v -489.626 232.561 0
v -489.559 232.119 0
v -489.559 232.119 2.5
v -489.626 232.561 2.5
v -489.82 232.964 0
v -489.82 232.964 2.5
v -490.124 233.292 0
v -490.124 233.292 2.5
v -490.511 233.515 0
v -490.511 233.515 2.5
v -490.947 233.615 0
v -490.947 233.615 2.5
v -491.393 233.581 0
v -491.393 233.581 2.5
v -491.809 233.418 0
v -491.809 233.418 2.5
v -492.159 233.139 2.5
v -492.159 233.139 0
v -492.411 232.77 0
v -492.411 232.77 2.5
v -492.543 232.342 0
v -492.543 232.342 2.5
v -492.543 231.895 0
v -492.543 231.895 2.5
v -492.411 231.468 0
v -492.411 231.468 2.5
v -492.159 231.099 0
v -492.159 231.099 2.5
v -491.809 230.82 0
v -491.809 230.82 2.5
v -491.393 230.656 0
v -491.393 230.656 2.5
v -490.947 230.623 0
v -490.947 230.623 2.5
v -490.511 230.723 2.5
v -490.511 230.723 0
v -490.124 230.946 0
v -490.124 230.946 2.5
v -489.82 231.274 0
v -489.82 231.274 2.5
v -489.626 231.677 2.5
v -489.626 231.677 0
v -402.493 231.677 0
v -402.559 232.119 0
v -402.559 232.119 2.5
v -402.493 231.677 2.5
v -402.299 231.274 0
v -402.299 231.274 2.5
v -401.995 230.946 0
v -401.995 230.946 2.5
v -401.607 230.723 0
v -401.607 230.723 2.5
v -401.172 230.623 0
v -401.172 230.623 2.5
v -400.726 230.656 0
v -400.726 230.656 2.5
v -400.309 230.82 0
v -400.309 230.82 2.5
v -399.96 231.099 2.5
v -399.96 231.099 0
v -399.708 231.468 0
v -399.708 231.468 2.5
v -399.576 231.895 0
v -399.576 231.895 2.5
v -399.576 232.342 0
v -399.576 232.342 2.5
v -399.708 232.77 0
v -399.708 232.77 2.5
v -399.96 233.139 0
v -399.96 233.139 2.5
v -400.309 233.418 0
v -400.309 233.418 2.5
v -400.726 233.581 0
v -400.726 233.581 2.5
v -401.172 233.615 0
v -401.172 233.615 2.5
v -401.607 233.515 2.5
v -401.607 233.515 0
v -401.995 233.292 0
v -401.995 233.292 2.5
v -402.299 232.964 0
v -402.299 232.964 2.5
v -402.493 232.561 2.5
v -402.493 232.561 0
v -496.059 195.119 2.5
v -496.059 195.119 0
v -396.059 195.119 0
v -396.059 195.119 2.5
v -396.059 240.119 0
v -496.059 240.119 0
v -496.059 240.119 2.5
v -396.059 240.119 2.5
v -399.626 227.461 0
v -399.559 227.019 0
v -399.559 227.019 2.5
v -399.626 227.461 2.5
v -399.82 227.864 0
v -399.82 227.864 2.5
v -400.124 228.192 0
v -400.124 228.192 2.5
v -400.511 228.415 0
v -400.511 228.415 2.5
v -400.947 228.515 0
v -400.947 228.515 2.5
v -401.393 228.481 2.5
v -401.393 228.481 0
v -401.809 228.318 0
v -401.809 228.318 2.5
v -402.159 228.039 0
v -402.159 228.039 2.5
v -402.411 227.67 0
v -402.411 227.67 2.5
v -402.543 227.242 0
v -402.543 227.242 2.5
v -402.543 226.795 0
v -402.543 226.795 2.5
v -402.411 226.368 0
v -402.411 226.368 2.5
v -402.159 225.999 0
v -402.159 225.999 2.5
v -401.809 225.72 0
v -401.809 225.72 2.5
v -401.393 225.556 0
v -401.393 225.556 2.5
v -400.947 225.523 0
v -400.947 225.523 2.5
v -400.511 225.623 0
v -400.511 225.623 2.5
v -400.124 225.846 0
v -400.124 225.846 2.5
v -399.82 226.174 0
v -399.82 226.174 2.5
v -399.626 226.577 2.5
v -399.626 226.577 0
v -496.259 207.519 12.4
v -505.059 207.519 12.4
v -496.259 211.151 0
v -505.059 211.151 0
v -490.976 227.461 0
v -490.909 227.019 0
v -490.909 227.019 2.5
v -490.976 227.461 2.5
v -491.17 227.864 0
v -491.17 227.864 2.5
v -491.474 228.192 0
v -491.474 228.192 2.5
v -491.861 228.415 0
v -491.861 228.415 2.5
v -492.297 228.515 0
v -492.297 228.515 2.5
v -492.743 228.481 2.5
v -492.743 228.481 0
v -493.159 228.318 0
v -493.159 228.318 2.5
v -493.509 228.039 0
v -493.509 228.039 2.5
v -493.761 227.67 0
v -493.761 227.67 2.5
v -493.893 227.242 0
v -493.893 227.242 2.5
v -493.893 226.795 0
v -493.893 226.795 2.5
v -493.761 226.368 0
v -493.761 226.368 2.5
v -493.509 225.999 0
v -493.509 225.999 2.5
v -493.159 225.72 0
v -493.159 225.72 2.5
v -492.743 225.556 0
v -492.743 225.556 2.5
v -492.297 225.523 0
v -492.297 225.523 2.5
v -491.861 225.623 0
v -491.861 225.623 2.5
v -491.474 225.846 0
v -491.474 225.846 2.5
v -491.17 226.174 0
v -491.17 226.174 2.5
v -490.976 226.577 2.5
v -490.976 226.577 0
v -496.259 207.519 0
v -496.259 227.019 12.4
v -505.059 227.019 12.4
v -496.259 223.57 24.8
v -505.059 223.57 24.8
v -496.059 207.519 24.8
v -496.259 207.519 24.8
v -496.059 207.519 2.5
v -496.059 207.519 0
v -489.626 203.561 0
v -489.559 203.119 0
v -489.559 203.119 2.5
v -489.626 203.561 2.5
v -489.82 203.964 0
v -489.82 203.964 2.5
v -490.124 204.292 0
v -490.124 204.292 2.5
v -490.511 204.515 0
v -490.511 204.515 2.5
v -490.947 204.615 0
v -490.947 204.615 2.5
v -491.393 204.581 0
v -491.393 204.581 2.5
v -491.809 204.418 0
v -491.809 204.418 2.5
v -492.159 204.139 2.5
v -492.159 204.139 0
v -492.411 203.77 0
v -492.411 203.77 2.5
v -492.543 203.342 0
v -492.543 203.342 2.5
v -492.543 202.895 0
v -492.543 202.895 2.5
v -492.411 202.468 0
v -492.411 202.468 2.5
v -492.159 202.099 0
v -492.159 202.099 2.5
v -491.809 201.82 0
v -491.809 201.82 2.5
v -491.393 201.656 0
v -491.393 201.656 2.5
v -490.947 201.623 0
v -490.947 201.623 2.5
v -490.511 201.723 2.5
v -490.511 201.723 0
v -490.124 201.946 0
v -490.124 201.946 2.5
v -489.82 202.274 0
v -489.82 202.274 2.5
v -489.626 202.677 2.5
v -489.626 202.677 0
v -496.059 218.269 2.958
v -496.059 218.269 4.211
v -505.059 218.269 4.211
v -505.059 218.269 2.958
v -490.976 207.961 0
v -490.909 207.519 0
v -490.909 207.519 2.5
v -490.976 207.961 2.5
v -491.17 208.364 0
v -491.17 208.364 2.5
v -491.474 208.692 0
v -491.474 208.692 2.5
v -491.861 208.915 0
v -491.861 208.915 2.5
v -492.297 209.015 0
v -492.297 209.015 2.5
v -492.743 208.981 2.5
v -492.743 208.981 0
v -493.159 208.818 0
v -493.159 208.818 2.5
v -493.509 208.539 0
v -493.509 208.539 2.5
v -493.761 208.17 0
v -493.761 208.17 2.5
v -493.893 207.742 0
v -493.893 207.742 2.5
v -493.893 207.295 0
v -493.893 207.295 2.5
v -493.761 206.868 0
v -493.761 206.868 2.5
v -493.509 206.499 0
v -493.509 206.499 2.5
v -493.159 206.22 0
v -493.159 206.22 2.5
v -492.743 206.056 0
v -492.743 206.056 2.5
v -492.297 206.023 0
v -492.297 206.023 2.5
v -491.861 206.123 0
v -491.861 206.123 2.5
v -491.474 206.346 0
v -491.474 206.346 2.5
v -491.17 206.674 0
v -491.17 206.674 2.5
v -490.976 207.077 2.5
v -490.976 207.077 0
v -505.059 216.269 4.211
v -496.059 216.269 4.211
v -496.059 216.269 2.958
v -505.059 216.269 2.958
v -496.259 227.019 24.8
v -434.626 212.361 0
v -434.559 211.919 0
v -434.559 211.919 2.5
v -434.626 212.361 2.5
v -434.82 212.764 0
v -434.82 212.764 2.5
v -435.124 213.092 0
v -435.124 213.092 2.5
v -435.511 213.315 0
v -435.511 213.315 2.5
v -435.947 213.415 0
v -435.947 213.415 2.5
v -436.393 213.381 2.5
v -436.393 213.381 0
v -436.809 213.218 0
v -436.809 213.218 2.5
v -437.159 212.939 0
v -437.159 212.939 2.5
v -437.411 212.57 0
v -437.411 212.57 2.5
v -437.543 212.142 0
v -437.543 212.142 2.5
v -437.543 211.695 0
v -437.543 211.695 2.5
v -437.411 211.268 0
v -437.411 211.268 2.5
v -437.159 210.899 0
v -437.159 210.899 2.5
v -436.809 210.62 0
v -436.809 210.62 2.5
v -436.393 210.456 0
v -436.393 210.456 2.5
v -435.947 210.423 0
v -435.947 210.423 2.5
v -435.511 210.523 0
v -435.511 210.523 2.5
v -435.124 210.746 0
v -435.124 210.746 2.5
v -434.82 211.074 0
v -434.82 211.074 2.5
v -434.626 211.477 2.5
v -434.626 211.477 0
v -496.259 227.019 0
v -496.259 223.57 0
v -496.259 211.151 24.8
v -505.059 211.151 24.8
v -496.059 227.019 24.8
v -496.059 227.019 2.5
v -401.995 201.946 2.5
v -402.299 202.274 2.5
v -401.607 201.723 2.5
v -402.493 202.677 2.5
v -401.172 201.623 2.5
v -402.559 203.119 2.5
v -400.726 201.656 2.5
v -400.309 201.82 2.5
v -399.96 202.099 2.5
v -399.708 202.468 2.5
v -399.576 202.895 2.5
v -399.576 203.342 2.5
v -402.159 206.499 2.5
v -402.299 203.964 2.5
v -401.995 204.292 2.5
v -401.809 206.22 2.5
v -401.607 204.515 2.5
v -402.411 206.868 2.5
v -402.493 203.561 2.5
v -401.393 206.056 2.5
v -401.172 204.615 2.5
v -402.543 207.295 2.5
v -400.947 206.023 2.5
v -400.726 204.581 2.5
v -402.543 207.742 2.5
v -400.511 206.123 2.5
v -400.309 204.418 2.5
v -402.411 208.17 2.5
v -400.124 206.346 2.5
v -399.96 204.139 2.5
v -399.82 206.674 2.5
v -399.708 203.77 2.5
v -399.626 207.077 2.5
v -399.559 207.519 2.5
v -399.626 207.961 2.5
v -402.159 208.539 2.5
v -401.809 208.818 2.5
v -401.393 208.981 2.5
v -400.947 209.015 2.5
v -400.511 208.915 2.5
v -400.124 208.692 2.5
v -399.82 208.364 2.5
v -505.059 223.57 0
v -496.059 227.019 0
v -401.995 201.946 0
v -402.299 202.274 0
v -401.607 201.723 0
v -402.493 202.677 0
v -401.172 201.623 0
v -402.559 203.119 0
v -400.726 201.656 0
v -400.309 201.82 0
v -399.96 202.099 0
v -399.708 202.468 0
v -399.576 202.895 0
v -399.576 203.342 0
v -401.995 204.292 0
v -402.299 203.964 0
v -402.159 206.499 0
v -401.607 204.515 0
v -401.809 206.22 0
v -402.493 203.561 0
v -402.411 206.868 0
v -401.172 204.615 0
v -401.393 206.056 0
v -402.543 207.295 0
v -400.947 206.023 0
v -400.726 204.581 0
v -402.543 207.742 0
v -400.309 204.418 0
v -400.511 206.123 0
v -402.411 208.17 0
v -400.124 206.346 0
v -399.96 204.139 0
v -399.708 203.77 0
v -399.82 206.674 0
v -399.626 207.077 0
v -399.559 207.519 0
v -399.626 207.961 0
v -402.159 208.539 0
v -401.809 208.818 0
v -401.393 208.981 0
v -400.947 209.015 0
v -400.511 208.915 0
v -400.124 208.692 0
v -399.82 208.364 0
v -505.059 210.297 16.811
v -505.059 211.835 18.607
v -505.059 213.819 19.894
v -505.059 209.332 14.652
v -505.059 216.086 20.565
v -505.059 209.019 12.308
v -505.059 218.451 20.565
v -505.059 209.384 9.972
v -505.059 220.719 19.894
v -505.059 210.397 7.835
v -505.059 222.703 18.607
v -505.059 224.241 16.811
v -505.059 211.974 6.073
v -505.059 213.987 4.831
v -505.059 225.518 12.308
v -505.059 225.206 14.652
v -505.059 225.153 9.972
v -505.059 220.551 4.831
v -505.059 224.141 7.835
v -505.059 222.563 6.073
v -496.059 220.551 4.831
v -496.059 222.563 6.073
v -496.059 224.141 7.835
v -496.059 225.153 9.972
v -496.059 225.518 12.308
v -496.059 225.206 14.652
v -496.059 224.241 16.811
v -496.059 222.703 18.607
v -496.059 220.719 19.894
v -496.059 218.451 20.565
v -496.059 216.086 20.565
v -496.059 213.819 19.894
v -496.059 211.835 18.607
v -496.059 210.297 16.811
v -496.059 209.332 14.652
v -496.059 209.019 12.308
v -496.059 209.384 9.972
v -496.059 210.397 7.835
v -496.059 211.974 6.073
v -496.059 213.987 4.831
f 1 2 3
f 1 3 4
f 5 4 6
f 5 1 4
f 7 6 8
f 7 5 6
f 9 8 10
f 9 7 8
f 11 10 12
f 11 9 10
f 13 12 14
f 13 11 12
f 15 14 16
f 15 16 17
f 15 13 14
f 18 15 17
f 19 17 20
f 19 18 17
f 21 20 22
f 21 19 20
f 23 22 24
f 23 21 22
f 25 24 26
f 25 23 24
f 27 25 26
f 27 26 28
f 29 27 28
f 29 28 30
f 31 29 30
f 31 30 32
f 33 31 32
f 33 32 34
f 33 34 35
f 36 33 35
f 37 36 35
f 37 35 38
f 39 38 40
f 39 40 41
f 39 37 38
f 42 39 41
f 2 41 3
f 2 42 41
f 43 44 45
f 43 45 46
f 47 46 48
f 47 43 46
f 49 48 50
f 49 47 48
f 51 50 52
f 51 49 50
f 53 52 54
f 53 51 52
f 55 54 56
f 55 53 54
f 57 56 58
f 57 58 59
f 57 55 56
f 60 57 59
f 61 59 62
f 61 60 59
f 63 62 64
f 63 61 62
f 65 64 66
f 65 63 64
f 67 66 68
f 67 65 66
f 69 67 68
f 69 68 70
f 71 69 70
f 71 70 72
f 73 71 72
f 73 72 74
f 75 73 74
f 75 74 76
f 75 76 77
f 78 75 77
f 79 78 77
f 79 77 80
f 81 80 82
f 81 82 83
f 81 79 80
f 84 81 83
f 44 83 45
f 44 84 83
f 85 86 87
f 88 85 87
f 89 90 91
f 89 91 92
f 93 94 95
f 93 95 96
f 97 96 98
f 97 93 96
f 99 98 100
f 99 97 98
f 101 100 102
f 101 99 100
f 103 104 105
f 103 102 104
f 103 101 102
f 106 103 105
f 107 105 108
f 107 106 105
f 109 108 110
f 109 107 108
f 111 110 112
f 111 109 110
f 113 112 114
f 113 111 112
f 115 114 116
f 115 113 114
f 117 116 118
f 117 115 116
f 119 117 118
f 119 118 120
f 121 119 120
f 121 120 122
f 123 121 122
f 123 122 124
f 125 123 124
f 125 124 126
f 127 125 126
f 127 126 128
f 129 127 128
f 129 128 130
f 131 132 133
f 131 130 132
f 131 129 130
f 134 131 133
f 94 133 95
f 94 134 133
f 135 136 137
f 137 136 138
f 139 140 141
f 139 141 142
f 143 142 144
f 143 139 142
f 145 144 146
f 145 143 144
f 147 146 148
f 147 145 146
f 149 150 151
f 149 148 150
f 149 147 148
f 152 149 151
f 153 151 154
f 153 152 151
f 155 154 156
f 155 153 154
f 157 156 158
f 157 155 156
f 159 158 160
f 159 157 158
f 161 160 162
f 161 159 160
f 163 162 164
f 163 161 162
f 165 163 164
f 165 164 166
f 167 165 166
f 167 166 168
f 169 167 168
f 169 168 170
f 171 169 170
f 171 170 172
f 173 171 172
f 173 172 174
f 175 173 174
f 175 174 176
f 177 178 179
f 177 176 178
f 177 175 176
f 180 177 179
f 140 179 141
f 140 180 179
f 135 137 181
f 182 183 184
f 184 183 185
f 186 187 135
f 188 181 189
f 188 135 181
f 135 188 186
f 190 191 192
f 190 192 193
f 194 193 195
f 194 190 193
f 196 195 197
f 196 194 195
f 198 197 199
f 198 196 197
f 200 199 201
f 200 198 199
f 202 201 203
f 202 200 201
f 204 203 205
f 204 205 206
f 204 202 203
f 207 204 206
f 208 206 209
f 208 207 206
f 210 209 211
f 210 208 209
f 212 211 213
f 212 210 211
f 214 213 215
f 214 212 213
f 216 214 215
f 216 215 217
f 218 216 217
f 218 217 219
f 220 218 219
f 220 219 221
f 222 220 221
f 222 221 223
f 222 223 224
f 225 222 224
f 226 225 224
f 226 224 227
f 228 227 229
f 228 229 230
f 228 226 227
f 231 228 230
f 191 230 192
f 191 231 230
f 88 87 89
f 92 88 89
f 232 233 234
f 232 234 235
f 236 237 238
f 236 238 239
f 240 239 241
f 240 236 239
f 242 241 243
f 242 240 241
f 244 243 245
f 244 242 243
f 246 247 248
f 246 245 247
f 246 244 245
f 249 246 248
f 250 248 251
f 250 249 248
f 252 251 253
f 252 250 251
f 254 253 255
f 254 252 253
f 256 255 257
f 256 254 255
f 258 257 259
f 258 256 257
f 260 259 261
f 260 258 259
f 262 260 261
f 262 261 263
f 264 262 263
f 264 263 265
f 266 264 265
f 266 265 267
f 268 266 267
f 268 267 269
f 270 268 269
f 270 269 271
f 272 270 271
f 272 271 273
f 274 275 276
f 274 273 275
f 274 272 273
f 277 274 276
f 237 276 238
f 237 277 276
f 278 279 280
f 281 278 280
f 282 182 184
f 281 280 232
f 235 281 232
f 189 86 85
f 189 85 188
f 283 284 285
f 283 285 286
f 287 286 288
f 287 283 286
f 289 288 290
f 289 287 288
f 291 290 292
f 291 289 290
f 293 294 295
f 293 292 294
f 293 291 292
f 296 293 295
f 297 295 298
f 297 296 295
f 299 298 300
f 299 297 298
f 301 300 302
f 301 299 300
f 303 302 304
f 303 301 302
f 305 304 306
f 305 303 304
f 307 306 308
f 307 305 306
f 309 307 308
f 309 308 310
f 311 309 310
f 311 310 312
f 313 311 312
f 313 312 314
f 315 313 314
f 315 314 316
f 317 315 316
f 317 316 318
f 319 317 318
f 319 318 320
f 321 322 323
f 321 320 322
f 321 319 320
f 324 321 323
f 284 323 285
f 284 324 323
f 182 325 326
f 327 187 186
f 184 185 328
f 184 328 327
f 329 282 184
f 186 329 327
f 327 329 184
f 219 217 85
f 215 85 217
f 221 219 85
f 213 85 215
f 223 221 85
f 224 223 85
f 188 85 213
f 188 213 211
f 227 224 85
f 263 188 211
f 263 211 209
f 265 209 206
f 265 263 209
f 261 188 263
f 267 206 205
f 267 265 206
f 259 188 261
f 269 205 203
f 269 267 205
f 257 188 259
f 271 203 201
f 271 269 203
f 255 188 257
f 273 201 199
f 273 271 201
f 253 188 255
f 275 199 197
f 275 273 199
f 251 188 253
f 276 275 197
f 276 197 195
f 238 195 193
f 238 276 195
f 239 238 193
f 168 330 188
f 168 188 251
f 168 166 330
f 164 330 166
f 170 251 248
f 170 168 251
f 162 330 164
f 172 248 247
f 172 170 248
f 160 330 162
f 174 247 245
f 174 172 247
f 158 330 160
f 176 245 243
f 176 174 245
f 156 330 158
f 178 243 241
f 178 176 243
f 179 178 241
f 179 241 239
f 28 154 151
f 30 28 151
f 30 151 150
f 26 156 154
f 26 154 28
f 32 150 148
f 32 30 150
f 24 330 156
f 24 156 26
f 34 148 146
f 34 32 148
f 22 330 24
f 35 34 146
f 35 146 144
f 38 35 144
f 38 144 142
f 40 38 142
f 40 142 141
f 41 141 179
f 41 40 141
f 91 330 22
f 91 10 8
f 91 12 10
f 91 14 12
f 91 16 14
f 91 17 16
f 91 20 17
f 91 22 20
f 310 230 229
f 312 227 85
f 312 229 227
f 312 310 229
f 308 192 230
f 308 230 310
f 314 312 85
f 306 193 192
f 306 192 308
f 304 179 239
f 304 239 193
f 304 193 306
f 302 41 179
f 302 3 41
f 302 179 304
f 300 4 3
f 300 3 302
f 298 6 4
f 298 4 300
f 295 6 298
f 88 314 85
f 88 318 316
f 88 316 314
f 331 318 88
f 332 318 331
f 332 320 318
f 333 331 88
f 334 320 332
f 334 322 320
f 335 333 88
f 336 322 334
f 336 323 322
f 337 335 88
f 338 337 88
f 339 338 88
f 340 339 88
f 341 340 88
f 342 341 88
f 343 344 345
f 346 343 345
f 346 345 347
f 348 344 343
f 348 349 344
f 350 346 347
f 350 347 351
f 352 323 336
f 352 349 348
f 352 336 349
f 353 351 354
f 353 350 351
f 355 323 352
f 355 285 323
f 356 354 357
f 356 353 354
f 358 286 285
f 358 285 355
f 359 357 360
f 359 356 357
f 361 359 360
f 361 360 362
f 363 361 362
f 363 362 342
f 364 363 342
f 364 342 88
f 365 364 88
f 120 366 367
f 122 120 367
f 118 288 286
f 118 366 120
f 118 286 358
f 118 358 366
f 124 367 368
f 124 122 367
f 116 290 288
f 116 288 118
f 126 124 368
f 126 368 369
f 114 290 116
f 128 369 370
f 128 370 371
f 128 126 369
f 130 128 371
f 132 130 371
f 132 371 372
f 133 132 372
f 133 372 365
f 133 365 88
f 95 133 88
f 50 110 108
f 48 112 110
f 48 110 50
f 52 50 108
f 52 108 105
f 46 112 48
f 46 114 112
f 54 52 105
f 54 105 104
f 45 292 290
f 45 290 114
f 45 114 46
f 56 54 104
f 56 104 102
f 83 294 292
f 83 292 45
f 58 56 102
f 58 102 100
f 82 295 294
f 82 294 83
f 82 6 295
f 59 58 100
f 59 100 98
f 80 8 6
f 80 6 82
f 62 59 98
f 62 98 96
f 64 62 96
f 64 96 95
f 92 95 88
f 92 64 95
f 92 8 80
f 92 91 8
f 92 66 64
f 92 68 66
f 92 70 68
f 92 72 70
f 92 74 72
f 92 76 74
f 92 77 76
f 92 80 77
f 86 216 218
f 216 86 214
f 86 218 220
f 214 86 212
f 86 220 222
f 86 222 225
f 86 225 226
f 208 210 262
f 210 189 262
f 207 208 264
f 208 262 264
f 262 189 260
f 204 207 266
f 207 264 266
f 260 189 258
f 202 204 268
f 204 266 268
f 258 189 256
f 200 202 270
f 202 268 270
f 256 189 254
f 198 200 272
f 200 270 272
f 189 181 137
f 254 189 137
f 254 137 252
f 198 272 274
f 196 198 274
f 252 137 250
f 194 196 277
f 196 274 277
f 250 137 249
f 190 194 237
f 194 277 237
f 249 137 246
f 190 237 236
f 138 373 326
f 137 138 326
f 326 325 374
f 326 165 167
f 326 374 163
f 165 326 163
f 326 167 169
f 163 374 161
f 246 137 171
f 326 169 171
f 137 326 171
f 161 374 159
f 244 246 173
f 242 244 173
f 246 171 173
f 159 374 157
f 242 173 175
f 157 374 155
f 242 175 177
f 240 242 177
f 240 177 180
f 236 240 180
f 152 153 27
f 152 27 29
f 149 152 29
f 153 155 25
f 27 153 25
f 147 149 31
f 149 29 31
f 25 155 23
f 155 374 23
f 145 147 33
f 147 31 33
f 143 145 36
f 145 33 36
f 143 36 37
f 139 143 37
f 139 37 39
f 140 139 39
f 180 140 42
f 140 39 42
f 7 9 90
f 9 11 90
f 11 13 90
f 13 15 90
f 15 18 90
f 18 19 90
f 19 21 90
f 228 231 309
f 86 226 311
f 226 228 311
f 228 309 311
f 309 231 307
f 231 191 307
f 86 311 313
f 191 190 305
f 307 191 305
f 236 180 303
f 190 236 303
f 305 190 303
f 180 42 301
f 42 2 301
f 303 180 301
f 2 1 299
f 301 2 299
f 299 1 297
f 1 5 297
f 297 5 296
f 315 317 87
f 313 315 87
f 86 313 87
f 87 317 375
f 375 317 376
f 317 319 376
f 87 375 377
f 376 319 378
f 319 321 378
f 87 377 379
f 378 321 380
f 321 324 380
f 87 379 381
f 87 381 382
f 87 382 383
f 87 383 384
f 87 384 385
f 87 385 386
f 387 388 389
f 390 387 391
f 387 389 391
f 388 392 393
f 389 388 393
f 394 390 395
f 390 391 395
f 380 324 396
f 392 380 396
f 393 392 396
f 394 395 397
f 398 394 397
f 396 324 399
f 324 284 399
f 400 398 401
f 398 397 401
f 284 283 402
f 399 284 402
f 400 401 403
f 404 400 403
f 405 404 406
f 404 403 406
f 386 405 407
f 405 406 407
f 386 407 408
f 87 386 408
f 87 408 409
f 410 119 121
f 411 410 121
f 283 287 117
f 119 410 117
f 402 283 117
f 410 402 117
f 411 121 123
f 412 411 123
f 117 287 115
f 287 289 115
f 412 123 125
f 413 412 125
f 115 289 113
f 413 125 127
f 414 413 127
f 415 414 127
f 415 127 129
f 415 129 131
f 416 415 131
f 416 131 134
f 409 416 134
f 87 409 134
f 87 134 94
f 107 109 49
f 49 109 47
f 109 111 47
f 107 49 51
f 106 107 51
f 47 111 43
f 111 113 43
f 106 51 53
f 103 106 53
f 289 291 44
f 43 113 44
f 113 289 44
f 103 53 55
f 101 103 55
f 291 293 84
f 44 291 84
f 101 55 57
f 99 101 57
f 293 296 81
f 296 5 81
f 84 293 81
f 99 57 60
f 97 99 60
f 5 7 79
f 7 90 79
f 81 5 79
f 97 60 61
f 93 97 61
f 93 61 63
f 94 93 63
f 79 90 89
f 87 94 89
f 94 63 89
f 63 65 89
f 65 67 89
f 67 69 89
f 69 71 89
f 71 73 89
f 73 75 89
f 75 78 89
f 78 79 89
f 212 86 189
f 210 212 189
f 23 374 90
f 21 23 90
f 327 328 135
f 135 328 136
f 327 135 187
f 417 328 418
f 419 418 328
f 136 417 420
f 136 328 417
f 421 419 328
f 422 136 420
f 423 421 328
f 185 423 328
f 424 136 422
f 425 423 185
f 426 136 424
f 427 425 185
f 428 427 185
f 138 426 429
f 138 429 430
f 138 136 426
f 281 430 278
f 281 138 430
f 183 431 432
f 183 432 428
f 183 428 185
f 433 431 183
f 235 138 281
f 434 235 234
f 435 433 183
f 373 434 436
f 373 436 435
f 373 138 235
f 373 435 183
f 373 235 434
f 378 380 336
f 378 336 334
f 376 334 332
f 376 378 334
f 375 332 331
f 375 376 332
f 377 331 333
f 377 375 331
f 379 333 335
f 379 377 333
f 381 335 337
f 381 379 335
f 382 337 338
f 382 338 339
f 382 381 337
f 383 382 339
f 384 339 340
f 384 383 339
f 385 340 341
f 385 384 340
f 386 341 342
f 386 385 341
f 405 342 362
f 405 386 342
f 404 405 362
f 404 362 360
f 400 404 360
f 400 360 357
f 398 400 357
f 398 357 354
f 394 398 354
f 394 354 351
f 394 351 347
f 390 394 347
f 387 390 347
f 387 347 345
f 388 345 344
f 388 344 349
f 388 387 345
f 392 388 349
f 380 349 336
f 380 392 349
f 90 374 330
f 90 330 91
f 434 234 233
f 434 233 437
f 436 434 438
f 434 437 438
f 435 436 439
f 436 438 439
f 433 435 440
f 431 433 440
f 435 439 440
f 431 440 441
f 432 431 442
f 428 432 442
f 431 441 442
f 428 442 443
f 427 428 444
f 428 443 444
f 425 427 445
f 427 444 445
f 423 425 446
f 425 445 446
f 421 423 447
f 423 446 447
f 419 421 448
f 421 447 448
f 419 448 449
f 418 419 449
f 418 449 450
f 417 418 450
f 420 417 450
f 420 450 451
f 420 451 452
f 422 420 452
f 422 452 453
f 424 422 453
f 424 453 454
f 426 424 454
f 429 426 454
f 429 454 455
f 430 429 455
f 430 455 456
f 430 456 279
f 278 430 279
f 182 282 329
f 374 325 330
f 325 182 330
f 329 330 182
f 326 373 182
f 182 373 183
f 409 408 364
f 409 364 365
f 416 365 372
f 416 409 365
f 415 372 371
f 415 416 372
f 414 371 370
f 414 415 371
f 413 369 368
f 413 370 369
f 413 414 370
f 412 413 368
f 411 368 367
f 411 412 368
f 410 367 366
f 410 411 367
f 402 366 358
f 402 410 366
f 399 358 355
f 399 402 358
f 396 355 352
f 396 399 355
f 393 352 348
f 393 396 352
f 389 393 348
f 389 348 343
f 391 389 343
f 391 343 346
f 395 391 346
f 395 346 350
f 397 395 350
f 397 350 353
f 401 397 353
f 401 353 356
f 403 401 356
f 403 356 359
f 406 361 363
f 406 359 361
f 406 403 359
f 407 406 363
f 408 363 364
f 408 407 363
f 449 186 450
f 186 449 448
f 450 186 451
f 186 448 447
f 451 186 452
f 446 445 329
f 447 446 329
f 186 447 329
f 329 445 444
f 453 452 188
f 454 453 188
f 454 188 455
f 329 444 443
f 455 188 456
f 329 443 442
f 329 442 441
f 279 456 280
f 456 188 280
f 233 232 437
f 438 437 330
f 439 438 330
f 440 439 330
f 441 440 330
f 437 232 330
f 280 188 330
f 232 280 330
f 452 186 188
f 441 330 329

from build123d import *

# Parameters (mm, degrees)
SKETCH1_W               = 100
SKETCH1_H               = 45
SKETCH1_R               = 1.5
BOSS_EXTRUDE2_DEPTH     = 2.5
CUT_EXTRUDE2_DEPTH      = 13
CUT_EXTRUDE2_DEPTH_BACK = 17
SKETCH2_R               = 1.5
SKETCH3_W               = 9
SKETCH3_H               = 19.5
BOSS_EXTRUDE3_DEPTH     = 24.8
CUT_EXTRUDE3_DEPTH      = 8.8
SKETCH7_R               = 8.25
CUT_EXTRUDE4_DEPTH      = 714.8
SKETCH8_W               = 1.252352654
SKETCH8_H               = 2
CUT_EXTRUDE5_DEPTH      = 714.8


with BuildPart() as part:
    # Sketch1 → Boss-Extrude2 (new body)
    with BuildSketch(Plane.XY):
        with Locations((-446.059405941, 217.618811881)):
            Rectangle(SKETCH1_W, SKETCH1_H)
        with Locations((-491.059405941, 232.118811881)):
            Circle(SKETCH1_R, mode=Mode.SUBTRACT)
        with Locations((-491.059405941, 203.118811881)):
            Circle(SKETCH1_R, mode=Mode.SUBTRACT)
        with Locations(Location((-401.059405941, 203.118811881, 0), (0, 0, 180))):
            Circle(SKETCH1_R, mode=Mode.SUBTRACT)
        with Locations(Location((-401.059405941, 232.118811881, 0), (0, 0, 180))):
            Circle(SKETCH1_R, mode=Mode.SUBTRACT)
    extrude(amount=BOSS_EXTRUDE2_DEPTH)

    # Sketch2 → Cut-Extrude2 (cut, two sides: drawn at the far end of the back side and taken through both)
    with BuildSketch(Plane.XY.offset(2.5).offset(-CUT_EXTRUDE2_DEPTH_BACK)):
        with Locations((-436.059405941, 211.918811881)):
            Circle(SKETCH2_R)
        with Locations((-401.059405941, 227.018811881)):
            Circle(SKETCH2_R)
        with Locations((-401.059405941, 207.518811881)):
            Circle(SKETCH2_R)
        with Locations((-492.409405941, 207.518811881)):
            Circle(SKETCH2_R)
        with Locations((-492.409405941, 227.018811881)):
            Circle(SKETCH2_R)
    extrude(amount=CUT_EXTRUDE2_DEPTH + CUT_EXTRUDE2_DEPTH_BACK, mode=Mode.SUBTRACT)

    # Sketch3 → Boss-Extrude3 (add)
    with BuildSketch(Plane.XY):
        with Locations((-500.559405941, 217.268811881)):
            Rectangle(SKETCH3_W, SKETCH3_H)
    extrude(amount=BOSS_EXTRUDE3_DEPTH)

    # Sketch4 → Cut-Extrude3 (cut)
    with BuildSketch(Plane.ZY.offset(505.059405941)):
        Polygon((0, 225.268811881), (0, 223.569543899), (12.4, 227.018811881), (0, 227.018811881), align=None)
        Polygon((24.8, 227.018811881), (12.4, 227.018811881), (24.8, 223.569543899), align=None)
        Polygon((24.8, 211.150624905), (12.4, 207.518811881), (24.8, 207.518811881), align=None)
        Polygon((12.4, 207.518811881), (0, 211.150624905), (0, 209.268811881), (0, 207.518811881), align=None)
    extrude(amount=-CUT_EXTRUDE3_DEPTH, mode=Mode.SUBTRACT)

    # Sketch7 → Cut-Extrude4 (cut)
    with BuildSketch(Plane(origin=(0, 0, 0), x_dir=(0, 0, -1), z_dir=(1, 0, 0))):
        with Locations((-12.4, 217.268811881)):
            Circle(SKETCH7_R)
    extrude(amount=-CUT_EXTRUDE4_DEPTH, mode=Mode.SUBTRACT)

    # Sketch8 → Cut-Extrude5 (cut)
    with BuildSketch(Plane(origin=(0, 0, 0), x_dir=(0, 0, -1), z_dir=(1, 0, 0))):
        with Locations((-3.584653996, 217.268811881)):
            Rectangle(SKETCH8_W, SKETCH8_H)
    extrude(amount=-CUT_EXTRUDE5_DEPTH, mode=Mode.SUBTRACT)


solid = part.part
